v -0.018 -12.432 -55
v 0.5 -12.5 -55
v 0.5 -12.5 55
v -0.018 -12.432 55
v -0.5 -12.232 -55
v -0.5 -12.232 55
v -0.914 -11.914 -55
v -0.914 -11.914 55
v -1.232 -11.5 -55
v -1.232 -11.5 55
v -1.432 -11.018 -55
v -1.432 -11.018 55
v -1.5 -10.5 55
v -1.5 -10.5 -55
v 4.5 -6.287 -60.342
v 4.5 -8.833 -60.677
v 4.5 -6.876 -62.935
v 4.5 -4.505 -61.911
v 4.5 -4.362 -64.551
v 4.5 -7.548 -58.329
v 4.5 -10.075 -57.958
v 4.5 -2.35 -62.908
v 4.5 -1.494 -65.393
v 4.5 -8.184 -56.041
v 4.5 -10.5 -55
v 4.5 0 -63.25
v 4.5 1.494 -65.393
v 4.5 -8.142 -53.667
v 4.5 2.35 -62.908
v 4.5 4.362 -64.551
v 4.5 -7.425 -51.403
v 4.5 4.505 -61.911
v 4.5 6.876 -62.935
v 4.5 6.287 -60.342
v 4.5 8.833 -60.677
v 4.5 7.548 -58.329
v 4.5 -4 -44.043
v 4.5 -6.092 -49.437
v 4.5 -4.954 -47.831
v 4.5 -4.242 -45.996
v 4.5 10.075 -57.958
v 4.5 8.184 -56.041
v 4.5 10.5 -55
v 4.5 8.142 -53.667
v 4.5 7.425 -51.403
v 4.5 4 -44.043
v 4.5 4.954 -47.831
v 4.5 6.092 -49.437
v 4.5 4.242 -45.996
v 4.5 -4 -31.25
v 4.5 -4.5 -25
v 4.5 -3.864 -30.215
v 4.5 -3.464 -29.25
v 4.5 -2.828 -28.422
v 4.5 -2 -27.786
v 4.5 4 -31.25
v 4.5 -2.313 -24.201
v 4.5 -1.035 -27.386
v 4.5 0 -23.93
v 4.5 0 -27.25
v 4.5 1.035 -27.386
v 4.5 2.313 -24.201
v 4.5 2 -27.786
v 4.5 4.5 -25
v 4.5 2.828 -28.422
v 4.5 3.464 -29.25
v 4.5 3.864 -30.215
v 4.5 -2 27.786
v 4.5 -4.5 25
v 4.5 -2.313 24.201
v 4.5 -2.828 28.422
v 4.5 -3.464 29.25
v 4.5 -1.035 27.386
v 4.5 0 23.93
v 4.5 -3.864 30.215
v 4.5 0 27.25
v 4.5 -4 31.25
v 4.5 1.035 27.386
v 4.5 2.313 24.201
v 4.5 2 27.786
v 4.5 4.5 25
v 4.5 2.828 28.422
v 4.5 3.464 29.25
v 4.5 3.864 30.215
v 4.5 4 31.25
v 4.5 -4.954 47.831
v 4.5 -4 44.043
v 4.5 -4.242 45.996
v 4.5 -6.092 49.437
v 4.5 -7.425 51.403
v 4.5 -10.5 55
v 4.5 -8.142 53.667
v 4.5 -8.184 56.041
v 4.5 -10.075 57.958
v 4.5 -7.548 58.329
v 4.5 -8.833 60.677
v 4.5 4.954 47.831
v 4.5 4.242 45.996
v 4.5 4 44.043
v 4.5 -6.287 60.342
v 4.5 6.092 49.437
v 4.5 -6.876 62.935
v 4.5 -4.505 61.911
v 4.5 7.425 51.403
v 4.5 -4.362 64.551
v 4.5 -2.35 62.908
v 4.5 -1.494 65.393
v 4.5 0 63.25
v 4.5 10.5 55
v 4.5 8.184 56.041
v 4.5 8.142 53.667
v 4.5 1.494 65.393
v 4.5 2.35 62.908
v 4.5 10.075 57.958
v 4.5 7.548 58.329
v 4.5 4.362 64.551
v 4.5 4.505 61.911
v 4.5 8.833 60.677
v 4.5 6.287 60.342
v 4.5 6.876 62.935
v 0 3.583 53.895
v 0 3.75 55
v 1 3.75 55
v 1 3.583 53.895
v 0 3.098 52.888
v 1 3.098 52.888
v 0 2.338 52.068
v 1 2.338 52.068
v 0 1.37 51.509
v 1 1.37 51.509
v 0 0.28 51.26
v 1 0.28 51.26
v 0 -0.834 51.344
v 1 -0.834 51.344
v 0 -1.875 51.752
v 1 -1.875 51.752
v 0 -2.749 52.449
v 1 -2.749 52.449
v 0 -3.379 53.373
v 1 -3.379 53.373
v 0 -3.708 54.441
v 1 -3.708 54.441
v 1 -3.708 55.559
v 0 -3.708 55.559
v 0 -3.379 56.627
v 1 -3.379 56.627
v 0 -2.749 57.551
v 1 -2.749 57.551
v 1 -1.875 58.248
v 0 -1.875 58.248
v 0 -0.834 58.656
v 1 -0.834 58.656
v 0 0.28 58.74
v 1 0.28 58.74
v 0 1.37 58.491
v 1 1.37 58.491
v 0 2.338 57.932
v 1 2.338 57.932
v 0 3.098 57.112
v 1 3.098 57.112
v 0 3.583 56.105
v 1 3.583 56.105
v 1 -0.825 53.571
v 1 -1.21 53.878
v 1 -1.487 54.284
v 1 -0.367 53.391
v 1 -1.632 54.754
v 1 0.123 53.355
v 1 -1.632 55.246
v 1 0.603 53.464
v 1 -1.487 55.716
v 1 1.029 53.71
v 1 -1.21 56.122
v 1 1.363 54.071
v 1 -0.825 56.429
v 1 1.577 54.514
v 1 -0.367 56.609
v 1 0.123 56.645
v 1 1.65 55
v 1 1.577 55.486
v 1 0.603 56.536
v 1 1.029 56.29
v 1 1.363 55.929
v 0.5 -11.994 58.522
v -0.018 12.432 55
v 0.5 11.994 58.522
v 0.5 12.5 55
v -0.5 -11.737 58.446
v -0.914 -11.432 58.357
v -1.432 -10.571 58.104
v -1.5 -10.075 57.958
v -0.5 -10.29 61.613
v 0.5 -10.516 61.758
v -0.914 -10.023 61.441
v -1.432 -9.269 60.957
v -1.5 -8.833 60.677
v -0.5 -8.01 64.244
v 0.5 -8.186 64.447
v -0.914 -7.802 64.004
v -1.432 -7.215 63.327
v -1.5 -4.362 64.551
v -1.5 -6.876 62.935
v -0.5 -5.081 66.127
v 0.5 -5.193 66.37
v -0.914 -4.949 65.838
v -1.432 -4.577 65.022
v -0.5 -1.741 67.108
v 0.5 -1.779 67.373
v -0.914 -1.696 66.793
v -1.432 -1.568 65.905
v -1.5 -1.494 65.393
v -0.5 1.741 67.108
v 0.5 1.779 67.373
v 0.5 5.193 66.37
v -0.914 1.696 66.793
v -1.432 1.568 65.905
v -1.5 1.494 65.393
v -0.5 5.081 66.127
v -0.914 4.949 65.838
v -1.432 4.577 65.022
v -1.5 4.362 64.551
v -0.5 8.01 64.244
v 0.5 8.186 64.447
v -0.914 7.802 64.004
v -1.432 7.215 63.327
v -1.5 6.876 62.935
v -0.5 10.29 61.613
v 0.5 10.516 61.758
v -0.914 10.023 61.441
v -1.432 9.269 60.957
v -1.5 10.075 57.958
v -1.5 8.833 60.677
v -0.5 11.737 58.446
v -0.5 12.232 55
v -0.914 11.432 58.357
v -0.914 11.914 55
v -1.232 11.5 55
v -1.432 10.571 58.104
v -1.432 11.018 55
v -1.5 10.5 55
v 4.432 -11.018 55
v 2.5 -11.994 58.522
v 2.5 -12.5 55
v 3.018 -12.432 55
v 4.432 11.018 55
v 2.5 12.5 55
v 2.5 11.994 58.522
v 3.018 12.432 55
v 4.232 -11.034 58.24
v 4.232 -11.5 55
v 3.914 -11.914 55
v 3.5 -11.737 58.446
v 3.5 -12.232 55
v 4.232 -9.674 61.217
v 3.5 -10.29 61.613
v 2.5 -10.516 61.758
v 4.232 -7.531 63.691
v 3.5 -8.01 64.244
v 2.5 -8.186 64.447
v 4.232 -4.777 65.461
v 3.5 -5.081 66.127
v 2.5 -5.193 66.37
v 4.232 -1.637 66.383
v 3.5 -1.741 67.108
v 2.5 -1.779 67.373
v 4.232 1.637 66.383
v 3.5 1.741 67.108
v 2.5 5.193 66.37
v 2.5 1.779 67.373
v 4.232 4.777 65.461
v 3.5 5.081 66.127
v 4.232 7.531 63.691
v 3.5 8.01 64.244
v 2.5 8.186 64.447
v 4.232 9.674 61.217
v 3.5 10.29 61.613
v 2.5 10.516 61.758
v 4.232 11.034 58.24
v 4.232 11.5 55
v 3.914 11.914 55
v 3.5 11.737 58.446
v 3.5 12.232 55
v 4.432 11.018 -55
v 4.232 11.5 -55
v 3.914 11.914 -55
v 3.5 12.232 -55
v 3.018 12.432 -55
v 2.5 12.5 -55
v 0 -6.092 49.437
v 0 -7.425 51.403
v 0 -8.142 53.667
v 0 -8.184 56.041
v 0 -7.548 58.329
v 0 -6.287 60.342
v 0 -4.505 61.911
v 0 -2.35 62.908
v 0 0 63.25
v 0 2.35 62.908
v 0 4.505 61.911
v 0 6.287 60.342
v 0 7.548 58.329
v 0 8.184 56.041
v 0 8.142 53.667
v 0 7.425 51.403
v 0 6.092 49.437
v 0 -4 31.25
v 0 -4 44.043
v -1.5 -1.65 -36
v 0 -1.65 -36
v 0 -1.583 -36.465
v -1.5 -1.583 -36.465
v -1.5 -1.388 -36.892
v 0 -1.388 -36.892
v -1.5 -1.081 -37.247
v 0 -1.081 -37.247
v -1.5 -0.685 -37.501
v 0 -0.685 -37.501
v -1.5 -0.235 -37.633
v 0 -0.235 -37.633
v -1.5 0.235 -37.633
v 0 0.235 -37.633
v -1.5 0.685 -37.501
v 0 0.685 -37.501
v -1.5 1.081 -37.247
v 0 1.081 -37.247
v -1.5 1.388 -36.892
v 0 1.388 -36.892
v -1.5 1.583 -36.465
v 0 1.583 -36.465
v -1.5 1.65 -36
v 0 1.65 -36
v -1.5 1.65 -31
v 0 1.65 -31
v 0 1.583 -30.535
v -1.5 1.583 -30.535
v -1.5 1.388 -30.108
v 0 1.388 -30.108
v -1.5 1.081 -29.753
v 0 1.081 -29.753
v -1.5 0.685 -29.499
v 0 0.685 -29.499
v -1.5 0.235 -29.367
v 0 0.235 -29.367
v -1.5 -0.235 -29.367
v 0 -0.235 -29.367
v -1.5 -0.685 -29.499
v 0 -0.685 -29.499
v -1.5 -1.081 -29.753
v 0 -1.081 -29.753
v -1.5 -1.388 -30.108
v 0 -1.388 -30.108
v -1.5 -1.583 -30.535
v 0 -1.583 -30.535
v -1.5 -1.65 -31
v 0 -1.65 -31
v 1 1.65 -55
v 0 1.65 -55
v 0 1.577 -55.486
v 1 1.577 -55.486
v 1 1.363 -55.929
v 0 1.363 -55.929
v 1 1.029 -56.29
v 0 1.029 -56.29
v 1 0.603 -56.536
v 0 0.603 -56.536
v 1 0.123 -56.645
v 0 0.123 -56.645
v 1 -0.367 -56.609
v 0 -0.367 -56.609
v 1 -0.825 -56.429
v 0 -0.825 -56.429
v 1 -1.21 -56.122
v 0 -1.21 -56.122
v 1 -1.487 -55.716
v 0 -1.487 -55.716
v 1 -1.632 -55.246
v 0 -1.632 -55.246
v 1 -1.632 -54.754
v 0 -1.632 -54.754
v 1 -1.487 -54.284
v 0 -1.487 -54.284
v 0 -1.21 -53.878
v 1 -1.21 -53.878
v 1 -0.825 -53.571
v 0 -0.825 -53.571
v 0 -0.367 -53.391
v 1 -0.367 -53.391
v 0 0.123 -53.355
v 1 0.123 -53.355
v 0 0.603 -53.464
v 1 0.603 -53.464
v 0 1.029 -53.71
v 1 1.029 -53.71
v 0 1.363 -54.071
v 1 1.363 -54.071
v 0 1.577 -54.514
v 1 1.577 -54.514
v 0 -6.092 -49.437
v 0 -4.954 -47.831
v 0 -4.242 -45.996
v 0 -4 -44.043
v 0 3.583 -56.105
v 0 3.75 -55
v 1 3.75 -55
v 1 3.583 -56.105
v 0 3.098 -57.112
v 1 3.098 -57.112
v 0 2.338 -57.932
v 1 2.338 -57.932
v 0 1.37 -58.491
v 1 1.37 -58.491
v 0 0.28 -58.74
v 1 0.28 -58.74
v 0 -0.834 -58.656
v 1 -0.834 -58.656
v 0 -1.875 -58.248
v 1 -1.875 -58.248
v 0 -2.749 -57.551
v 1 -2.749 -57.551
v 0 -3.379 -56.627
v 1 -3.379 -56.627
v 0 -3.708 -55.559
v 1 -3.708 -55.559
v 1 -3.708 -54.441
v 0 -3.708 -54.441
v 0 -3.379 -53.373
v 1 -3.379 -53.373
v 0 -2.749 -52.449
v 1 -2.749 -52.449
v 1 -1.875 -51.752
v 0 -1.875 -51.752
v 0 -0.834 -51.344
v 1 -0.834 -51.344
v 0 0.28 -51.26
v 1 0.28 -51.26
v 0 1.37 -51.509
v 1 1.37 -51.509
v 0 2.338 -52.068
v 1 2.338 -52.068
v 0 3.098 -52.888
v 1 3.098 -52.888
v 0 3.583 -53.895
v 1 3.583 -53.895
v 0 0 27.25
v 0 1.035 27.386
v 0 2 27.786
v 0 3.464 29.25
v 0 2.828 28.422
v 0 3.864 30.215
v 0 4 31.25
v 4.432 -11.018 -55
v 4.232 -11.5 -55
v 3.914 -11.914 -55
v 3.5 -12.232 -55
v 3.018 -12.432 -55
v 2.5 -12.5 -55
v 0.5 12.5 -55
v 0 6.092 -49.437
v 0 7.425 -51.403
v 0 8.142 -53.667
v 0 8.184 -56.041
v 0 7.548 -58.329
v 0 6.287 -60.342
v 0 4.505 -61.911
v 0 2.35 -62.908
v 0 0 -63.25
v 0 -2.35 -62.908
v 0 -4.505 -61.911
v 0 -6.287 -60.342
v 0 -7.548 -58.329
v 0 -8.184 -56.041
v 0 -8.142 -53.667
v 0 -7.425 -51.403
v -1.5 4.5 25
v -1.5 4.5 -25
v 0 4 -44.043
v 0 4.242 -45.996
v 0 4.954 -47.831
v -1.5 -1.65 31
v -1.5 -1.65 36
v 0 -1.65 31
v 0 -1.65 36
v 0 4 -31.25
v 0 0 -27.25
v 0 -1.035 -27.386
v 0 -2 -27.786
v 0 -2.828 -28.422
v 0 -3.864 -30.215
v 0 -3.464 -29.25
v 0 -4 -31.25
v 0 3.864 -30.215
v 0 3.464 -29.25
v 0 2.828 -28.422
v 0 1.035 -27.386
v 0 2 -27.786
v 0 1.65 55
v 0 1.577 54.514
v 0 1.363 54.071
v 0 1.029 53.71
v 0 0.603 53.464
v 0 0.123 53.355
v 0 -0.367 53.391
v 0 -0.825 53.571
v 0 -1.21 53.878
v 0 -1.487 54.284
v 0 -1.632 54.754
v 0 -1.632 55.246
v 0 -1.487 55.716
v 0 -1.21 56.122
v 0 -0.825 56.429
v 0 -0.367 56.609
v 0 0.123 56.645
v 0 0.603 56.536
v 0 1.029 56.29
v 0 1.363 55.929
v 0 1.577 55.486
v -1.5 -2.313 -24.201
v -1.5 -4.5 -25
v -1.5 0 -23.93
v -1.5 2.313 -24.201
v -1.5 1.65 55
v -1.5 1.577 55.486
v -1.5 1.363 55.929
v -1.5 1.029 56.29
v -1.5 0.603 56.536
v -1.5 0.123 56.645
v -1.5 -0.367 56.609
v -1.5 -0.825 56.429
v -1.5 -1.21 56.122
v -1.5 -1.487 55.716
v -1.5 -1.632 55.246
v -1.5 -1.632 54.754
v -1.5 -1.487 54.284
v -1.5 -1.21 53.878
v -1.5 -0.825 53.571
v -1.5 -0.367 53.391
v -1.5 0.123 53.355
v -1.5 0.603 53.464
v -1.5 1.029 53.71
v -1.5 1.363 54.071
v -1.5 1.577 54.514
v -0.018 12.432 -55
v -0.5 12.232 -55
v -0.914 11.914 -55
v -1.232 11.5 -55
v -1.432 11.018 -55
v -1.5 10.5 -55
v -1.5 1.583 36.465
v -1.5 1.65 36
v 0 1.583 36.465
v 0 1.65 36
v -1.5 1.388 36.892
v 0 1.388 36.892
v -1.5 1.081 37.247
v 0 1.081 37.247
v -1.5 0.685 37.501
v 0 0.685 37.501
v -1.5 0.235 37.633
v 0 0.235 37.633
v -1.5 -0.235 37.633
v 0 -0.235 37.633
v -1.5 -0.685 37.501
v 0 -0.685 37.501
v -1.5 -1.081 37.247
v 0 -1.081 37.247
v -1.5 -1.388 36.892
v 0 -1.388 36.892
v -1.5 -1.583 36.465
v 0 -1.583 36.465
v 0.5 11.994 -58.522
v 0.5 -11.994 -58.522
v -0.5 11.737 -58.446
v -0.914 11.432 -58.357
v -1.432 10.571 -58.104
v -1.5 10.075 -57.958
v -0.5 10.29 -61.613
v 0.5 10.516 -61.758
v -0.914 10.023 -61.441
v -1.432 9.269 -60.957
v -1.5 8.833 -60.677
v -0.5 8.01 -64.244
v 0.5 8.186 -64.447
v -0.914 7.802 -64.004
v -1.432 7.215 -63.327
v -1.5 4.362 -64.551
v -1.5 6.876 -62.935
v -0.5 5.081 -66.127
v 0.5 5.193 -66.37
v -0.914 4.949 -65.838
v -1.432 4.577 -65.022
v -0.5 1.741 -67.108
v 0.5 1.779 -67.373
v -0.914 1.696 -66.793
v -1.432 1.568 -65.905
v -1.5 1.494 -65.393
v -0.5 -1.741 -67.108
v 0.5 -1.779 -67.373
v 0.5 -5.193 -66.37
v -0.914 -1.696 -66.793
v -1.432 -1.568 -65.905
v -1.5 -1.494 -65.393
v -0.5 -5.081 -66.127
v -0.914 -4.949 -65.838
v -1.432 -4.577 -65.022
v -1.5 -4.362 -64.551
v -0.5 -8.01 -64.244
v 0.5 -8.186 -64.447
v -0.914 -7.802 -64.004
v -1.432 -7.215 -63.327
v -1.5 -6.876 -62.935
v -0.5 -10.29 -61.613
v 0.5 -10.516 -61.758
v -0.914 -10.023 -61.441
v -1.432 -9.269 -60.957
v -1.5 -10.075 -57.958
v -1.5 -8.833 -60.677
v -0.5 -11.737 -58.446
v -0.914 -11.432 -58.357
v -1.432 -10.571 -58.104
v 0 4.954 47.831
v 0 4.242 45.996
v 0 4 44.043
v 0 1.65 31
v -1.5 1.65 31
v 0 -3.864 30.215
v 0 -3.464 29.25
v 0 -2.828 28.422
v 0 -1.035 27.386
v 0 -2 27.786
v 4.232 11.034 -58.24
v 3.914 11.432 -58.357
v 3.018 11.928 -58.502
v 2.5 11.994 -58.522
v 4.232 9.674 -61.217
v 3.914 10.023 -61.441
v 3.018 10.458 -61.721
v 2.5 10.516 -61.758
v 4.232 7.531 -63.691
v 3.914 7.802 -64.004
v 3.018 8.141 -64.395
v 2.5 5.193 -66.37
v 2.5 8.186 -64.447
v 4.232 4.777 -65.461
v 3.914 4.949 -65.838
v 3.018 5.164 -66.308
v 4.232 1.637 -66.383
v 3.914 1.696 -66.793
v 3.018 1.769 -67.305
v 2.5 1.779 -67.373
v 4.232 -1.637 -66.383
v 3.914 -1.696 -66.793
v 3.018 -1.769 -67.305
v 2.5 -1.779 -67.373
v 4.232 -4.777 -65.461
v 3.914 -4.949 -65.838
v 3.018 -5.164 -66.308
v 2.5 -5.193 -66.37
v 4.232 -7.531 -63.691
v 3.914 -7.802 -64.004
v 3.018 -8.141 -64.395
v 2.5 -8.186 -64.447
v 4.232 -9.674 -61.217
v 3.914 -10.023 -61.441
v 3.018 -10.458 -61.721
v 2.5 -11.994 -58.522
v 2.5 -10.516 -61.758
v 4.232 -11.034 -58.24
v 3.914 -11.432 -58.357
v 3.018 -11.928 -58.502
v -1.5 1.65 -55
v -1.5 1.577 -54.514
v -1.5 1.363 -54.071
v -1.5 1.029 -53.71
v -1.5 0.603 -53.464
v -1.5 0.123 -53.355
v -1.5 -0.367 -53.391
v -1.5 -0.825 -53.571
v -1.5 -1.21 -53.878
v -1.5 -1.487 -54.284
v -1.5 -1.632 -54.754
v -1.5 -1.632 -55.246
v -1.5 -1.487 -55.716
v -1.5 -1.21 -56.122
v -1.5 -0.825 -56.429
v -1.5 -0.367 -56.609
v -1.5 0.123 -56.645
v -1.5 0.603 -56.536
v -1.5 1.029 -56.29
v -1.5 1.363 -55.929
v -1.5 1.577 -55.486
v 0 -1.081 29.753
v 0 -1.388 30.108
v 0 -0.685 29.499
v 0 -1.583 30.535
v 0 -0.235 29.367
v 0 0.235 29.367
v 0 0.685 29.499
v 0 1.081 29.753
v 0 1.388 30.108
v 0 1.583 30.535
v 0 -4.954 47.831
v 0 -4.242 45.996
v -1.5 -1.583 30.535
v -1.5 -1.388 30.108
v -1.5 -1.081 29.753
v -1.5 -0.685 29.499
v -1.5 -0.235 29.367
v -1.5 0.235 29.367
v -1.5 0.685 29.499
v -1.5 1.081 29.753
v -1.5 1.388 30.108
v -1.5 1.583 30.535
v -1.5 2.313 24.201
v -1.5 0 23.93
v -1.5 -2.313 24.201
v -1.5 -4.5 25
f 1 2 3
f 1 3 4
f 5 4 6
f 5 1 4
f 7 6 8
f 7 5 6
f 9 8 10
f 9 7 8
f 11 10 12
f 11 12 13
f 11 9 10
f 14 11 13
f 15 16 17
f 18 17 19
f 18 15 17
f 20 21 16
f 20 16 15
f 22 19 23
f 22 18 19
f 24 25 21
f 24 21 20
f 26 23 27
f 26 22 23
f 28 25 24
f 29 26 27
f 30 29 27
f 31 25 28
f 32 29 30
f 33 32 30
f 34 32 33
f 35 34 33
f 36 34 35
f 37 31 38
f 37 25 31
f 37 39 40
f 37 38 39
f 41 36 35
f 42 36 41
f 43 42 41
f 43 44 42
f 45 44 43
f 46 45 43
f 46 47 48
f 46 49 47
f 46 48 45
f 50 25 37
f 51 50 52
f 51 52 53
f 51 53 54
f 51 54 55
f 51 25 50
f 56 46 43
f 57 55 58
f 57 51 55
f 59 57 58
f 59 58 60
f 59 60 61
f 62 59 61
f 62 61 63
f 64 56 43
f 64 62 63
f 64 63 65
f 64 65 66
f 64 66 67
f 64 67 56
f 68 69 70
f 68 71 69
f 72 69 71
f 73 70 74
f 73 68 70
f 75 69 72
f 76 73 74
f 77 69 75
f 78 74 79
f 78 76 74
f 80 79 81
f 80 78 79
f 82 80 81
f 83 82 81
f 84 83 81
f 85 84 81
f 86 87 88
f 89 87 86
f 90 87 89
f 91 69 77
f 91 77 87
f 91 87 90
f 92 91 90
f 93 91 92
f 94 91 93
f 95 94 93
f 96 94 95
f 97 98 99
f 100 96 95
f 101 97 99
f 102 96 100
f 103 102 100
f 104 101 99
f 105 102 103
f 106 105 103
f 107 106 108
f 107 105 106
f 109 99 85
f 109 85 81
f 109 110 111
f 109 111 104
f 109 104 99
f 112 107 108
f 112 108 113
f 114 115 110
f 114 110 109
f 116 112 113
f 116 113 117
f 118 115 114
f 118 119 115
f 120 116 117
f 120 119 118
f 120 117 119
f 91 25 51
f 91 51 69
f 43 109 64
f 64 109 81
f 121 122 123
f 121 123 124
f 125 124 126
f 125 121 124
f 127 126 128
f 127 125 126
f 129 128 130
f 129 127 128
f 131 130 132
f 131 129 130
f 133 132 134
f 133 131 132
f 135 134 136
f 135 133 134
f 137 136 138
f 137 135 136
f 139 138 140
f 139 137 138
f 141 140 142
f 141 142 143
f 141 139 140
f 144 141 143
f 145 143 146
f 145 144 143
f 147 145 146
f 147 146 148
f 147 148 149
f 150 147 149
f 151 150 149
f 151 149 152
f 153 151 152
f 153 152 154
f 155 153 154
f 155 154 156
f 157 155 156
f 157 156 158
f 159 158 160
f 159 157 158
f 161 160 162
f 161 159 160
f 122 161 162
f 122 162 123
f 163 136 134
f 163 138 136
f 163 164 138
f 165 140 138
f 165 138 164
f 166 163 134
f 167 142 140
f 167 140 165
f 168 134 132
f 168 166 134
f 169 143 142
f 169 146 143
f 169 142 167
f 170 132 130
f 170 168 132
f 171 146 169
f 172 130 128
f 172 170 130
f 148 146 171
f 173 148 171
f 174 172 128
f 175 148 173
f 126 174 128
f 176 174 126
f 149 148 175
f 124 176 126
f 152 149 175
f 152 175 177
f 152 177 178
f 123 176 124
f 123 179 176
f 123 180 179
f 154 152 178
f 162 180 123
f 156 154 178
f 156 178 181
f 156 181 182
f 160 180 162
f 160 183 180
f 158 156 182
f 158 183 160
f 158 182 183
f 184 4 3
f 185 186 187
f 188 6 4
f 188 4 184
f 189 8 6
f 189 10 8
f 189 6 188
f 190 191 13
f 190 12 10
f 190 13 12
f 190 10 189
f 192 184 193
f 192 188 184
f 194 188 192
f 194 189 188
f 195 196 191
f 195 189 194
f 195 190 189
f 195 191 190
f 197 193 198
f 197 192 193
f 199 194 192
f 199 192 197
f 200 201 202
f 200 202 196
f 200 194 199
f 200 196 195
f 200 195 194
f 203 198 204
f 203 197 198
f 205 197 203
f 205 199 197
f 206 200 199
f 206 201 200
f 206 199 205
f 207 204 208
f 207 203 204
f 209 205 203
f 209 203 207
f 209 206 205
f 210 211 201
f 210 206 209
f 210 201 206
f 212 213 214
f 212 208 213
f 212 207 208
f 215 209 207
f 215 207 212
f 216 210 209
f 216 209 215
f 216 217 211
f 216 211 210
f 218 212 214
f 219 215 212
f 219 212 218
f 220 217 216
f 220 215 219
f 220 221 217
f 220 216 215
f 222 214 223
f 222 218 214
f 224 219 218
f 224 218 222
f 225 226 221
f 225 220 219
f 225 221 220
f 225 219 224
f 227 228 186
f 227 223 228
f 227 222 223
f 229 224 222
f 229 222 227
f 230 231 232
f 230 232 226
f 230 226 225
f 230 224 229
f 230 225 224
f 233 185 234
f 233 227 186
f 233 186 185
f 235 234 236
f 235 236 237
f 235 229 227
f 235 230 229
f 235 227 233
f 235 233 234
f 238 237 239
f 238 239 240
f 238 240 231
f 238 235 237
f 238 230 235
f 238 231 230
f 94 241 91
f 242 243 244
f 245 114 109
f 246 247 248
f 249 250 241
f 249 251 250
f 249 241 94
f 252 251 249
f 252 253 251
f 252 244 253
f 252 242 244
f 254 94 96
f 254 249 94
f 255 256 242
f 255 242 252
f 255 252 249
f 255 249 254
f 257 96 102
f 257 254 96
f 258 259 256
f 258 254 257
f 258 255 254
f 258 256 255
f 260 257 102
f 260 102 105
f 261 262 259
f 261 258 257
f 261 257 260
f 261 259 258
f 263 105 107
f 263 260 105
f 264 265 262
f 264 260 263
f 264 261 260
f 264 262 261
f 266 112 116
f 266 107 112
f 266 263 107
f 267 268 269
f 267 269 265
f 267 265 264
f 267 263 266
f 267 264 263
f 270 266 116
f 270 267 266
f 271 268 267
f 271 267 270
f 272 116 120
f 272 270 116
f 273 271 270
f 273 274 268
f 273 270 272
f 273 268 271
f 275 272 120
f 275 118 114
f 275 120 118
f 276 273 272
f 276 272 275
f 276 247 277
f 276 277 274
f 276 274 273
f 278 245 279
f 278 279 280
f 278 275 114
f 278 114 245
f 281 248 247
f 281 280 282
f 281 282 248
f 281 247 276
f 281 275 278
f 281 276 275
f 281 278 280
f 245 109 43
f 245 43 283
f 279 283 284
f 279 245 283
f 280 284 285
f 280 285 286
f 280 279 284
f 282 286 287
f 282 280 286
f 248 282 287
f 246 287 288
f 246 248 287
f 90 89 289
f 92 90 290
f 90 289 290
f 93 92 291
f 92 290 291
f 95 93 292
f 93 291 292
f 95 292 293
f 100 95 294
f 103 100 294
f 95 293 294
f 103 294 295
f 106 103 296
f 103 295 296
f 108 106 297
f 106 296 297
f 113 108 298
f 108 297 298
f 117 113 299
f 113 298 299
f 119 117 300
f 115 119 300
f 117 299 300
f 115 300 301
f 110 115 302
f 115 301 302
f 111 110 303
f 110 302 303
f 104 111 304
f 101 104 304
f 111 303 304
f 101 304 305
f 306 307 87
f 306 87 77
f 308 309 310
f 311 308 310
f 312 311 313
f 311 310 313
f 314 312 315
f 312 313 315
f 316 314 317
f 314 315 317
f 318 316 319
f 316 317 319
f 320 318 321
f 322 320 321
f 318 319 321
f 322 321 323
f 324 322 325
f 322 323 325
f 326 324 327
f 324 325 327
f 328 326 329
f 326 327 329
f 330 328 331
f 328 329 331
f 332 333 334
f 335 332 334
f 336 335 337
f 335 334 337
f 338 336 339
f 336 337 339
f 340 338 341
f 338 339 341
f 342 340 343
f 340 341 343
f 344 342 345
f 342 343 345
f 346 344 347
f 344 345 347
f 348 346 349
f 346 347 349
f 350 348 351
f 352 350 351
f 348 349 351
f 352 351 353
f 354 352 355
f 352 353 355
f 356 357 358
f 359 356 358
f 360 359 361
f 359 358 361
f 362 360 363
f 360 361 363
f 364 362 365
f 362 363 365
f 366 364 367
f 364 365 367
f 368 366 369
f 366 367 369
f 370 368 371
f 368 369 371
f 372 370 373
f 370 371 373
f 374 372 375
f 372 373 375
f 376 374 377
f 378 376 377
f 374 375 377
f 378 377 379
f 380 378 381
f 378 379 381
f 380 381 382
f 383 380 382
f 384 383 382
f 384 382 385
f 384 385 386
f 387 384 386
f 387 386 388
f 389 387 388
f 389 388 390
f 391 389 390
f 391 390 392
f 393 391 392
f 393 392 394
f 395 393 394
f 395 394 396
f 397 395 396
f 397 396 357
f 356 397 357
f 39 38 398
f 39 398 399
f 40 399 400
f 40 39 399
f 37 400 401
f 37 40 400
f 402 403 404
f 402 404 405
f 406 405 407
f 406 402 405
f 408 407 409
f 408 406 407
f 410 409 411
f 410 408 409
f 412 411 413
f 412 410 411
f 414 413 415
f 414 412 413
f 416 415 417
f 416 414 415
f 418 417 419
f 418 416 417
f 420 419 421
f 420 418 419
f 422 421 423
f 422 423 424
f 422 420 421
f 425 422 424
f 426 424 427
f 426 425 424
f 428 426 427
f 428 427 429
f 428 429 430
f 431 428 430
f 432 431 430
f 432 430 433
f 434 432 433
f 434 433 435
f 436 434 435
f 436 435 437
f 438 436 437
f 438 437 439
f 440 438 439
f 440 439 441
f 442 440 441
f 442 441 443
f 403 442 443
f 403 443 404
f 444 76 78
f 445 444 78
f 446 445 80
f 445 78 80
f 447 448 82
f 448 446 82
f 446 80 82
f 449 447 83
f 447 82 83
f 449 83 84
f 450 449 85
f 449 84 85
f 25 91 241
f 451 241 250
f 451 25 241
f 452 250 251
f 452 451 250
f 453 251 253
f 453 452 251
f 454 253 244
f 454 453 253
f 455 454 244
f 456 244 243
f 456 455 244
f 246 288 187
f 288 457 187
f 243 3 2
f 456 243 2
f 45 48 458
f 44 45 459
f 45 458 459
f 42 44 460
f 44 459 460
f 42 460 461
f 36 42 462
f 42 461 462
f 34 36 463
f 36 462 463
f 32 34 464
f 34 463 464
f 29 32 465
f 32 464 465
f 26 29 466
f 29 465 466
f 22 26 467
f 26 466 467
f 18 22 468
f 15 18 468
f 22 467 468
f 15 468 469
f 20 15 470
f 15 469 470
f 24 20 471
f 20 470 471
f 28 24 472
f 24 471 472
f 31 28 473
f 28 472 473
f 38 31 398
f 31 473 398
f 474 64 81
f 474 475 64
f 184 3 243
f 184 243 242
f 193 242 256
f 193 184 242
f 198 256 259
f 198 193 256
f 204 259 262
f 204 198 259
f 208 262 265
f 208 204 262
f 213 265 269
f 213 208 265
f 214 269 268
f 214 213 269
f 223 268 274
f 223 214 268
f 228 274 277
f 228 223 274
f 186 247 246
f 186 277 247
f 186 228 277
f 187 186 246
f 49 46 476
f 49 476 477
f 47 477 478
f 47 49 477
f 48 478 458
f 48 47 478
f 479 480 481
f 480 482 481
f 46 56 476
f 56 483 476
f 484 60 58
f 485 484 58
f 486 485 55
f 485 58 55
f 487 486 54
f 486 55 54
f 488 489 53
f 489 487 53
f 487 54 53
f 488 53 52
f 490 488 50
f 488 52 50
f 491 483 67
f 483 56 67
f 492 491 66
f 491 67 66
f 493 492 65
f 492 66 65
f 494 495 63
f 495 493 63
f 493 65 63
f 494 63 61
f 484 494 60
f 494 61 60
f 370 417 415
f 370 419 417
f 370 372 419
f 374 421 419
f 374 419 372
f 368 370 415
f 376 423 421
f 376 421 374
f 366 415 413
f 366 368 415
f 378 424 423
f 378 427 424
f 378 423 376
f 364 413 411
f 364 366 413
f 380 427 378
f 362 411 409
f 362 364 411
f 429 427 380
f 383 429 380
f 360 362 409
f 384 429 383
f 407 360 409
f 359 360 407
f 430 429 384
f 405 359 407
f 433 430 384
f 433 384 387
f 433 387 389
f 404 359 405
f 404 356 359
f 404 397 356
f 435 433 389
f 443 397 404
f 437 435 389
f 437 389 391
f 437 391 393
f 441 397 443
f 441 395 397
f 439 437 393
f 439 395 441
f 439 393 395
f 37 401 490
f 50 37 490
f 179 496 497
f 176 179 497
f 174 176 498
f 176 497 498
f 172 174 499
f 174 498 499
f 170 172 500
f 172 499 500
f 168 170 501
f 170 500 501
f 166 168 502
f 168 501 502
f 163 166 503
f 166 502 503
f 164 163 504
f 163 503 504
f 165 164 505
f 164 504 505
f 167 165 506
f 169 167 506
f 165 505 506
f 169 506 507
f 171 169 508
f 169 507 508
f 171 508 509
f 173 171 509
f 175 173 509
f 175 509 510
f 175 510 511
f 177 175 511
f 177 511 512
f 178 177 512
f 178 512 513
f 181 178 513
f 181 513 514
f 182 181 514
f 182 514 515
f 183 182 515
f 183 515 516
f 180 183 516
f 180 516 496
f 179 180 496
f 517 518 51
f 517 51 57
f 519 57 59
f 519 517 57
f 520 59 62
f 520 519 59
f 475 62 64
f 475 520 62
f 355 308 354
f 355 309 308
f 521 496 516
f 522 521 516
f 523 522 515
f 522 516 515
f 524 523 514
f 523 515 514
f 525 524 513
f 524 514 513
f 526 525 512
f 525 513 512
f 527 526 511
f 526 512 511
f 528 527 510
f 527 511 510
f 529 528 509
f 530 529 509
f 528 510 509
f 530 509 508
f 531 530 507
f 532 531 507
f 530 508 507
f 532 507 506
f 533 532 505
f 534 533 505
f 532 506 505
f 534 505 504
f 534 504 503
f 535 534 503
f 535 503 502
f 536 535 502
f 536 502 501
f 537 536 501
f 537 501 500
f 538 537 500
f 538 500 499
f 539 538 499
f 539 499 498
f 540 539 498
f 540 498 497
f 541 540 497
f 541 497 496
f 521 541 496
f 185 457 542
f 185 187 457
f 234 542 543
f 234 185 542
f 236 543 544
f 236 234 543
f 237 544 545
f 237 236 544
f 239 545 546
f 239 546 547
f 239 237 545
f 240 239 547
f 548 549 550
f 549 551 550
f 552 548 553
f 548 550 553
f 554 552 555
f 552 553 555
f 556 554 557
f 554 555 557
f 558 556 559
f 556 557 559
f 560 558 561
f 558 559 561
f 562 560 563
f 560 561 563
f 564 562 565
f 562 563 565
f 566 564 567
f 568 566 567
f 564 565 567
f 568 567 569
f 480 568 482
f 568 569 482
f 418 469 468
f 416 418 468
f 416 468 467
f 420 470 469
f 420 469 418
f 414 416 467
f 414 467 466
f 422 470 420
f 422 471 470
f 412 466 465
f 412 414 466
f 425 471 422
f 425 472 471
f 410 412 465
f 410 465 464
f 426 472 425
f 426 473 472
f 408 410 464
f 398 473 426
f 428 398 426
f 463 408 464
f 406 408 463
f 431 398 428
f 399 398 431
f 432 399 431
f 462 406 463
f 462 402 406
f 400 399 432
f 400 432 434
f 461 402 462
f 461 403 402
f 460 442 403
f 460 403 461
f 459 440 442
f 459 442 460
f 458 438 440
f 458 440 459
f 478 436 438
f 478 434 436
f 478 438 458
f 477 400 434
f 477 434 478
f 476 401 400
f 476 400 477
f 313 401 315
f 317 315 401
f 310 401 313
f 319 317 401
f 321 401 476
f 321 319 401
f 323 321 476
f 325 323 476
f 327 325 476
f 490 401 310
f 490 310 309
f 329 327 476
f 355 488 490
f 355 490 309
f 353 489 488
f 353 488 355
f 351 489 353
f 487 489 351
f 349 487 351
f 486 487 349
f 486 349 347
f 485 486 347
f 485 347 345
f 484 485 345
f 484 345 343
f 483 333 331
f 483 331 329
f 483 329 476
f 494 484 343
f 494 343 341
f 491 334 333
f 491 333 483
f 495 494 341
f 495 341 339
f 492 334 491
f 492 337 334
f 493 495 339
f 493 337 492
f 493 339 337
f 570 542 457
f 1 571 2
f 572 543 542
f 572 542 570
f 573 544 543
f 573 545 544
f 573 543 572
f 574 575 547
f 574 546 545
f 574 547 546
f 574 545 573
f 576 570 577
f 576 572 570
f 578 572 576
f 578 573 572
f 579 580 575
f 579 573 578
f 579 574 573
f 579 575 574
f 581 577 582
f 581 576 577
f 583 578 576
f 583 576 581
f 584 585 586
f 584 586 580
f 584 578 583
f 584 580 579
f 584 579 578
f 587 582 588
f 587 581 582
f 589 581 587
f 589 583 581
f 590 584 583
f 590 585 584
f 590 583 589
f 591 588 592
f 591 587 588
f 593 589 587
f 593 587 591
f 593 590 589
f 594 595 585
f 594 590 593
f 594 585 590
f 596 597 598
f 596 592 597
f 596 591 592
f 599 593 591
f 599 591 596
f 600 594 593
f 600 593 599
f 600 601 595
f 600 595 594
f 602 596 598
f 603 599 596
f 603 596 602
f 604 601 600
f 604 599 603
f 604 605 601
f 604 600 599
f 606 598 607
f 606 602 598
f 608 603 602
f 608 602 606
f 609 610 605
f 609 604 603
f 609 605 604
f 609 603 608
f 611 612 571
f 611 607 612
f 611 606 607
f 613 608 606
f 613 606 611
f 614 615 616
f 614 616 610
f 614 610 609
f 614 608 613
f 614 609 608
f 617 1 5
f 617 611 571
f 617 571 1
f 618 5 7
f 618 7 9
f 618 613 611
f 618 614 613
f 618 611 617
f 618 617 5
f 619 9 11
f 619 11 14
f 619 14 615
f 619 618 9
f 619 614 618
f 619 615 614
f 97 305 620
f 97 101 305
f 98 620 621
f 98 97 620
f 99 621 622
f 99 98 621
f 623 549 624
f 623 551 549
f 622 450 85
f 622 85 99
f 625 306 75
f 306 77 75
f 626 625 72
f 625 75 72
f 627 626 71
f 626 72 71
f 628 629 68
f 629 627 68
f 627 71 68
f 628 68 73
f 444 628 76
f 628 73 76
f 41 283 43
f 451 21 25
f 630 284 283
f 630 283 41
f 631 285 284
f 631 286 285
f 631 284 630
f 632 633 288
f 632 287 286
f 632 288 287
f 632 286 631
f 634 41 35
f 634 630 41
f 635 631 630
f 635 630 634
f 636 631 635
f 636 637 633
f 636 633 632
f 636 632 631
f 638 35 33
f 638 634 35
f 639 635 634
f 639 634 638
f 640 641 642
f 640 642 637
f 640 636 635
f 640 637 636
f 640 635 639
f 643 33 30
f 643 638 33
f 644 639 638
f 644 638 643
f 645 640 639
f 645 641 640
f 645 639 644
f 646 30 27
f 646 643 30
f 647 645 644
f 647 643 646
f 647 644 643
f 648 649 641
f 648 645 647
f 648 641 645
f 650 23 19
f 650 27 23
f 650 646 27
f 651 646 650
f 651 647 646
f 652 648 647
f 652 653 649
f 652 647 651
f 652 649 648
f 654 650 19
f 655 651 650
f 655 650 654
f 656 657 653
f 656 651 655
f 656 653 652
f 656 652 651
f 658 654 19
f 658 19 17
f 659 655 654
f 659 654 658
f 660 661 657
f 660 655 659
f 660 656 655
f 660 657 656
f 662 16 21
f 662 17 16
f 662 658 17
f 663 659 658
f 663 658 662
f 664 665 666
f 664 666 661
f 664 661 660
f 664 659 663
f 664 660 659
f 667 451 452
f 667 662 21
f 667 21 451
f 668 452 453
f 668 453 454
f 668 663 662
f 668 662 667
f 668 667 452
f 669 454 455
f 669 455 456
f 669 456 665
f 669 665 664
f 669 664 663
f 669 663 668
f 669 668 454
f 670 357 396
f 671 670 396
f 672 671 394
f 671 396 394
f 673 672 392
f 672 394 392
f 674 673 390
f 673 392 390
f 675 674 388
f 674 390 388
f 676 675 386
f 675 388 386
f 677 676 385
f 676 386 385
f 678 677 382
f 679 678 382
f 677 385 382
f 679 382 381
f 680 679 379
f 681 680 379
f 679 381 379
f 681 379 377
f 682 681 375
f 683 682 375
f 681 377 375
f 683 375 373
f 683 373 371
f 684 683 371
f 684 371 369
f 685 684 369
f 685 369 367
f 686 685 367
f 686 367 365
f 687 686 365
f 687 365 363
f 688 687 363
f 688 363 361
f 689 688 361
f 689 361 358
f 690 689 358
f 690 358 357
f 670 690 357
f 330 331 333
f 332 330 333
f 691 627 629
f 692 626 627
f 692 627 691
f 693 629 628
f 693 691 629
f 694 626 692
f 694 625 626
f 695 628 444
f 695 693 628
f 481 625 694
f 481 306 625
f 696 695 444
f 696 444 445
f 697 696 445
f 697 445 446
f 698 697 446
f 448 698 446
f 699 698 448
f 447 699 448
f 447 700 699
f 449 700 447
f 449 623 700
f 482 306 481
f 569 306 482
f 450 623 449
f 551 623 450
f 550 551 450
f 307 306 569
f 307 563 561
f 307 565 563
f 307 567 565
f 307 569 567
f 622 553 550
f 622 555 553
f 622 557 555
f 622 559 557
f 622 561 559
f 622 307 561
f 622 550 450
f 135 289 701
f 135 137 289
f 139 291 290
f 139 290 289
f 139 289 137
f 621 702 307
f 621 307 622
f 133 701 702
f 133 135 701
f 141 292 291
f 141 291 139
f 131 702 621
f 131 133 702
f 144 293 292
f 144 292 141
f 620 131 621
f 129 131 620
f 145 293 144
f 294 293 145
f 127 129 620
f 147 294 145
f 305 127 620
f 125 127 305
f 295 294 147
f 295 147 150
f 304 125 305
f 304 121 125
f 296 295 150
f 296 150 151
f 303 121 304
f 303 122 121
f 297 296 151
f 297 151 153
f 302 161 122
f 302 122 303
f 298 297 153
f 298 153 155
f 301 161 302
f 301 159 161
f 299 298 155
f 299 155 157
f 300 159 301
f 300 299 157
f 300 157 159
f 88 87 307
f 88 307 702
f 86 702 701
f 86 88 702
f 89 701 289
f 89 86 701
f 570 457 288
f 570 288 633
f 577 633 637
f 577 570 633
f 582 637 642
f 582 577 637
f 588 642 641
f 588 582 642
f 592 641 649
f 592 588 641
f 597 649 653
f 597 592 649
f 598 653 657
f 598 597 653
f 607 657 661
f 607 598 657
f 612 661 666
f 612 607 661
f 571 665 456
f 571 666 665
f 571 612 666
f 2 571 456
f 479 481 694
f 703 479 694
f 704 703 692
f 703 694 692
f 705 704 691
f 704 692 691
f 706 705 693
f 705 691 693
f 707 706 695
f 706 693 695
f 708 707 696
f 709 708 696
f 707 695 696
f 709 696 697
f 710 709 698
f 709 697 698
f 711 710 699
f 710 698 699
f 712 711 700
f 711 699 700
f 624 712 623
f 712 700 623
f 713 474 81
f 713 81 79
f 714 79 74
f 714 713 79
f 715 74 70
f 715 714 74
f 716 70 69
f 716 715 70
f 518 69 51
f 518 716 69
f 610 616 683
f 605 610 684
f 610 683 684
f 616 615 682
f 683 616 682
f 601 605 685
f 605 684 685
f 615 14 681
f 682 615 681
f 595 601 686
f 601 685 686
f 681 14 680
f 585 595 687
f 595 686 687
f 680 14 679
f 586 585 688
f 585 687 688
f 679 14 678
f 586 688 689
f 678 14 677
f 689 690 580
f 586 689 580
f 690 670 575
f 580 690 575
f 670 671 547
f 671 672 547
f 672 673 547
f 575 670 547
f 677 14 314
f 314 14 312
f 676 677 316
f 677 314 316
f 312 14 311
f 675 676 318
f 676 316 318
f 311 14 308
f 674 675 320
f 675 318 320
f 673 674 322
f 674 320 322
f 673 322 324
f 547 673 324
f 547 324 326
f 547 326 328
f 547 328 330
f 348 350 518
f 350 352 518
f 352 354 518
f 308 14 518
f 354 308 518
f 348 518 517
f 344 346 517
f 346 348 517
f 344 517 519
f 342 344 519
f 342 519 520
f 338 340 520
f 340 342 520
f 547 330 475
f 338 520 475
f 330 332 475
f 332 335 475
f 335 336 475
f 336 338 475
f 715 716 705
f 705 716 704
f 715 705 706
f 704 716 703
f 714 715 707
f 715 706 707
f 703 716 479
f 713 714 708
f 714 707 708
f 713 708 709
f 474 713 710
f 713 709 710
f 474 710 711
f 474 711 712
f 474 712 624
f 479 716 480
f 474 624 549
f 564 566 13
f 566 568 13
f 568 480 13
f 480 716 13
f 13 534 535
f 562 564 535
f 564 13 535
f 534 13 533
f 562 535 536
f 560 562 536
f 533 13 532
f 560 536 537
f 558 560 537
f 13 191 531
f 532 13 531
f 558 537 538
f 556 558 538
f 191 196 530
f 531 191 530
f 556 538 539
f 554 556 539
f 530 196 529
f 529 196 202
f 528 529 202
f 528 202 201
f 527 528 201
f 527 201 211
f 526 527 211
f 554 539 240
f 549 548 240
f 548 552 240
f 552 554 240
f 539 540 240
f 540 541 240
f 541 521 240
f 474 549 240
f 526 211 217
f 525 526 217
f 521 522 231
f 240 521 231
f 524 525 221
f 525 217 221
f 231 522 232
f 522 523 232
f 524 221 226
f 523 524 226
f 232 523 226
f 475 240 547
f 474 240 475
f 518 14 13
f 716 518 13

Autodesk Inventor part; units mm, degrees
ref_plane "YZ Plane" through (0, 0, 0) normal (1, 0, 0) x (0, 1, 0)
ref_plane "XZ Plane" through (0, 0, 0) normal (0, 1, 0) x (-1, 0, 0)
ref_plane "XY Plane" through (0, 0, 0) normal (0, 0, 1) x (1, 0, 0)
sketch "Sketch1" plane through (0, 0, 0) normal (1, 0, 0) x (0, 1, 0)
  line L0 (12.5, 55) -> (-12.5, 55)
  line L1 (-12.5, 55) -> (-12.5, -55)
  line L2 (-12.5, -55) -> (12.5, -55)
  line L3 (12.5, -55) -> (12.5, 55)
  arc A0 (12.5, 55) -> (-12.5, 55) centre (0, 55) ccw
  arc A1 (-12.5, -55) -> (12.5, -55) centre (0, -55) ccw
  circle A2 centre (0, 55) radius 1.65
  circle A3 centre (0, 55) radius 3.75
  circle A4 centre (0, 55) radius 8.25
  line L4 (4, 55) -> (-4, 55)
  line L5 (-4, 55) -> (-4, 27.25)
  line L6 (-4, 27.25) -> (4, 27.25)
  line L7 (4, 27.25) -> (4, 55)
  circle A5 centre (0, 31) radius 1.65
  circle A6 centre (0, 36) radius 1.65
  line L8 (1.65, 36) -> (1.65, 31)
  line L9 (-1.65, 36) -> (-1.65, 31)
  line L10 (12.5, 0) -> (-12.5, 0) construction
  circle A7 centre (0, -55) radius 1.65
  circle A8 centre (0, -55) radius 3.75
  circle A9 centre (0, -55) radius 8.25
  line L11 (-4, -55) -> (-4, -27.25)
  line L12 (-4, -27.25) -> (4, -27.25)
  line L13 (4, -27.25) -> (4, -55)
  circle A10 centre (0, -31) radius 1.65
  circle A11 centre (0, -36) radius 1.65
  line L14 (1.65, -36) -> (1.65, -31)
  line L15 (-1.65, -36) -> (-1.65, -31)
  line L16 (4.5, 25) -> (-4.5, 25)
  line L17 (-4.5, 25) -> (-4.5, -25)
  line L18 (-4.5, -25) -> (4.5, -25)
  line L19 (4.5, -25) -> (4.5, 25)
  line L20 (4.5, 25) -> (-4.5, -25) construction
  line L21 (-4.5, 25) -> (4.5, -25) construction
  arc A12 (-4.5, 25) -> (4.5, 25) centre (0, 33.9303) ccw
  arc A13 (4.5, -25) -> (-4.5, -25) centre (0, -33.9303) ccw
  point P0 (0, 0)
  point P1 (0, 55)
  point P2 (-4, -47.7846)
  point P3 (4, -47.7846)
  point P4 (4, 47.7846)
  point P5 (-4, 47.7846)
  point P6 (0, 0)
  point P7 (3.75, 55)
  point P8 (-3.75, 55)
  dimension "d0" = 110
  dimension "d1" = 55
  dimension "d2" = 12.5
  dimension "d3" = 25
  dimension "d4" = 3.3
  dimension "d5" = 7.5
  dimension "d6" = 16.5
  dimension "d7" = 8
  dimension "d8" = 4
  dimension "d10" = 36
  dimension "d11" = 3.3
  dimension "d12" = 24
  dimension "d13" = 4
  dimension "d14" = 3.3
  dimension "d15" = 5
  dimension "d16" = 4
  dimension "d34" = 50
  dimension "d35" = 8
  dimension "d36" = 8
  dimension "d37" = 10
  dimension "d38" = 10
extrude "Extrusion1" add sketch "Sketch1" along normal blind 4.5 contours L3 L2 A9 L13 L12 L11 L1 L0 A4 L5 L6 L7 | L0 A4 A0 | A1 L2 A9 | A12 L16 | L18 A13
extrude "Extrusion2" add sketch "Sketch1" against normal blind 1.5 contours L3 L2 A9 L13 L12 L11 L1 L0 A4 L5 L6 L7 | L0 A4 A0 | A4 L7 L0 | L0 A3 A4 | A1 L2 A9 | L7 A4 L5 L0 A3 | L0 L5 A4 | L7 L6 L5 A4 | A9 L2 A8 | L2 L13 A9 | A3 L0 A2 | L0 A2 A3 | L2 A8 L11 A9 L13 | A9 L11 L12 L13 | A9 L11 L2 | A8 L2 A7 | L2 A7 A8 | A12 L16 | L18 A13
extrude "Extrusion3" add sketch "Sketch1" along normal blind 1 contours A3 L0 A2 | L0 A2 A3 | A8 L2 A7 | L2 A7 A8
fillet "Fillet1" radius 4 4 edges at (2.25, -4, 27.25) (2.25, 4, 27.25) (2.25, -4, -27.25) (2.25, 4, -27.25)
fillet "Fillet2" radius 8 4 edges at (2.25, -4, -47.7846) (2.25, 4, -47.7846) (2.25, -4, 47.7846) (2.25, 4, 47.7846)
fillet "Fillet3" radius 2 8 edges at (4.5, 0, 67.5) (4.5, -12.5, 0) (4.5, 0, -67.5) (4.5, 12.5, 0) (-1.5, 0, -67.5) (-1.5, -12.5, 0) (-1.5, 0, 67.5) (-1.5, 12.5, 0)
equation "\"d0\" = FEMUR_X"
equation "\"d1\" = 0.5 * FEMUR_X"
equation "\"d2\" = 0.5 * FEMUR_WIDTH"
equation "\"d3\" = FEMUR_WIDTH"
equation "\"d4\" = HornScrewDiameter"
equation "\"d5\" = HornCentreDiameter"
equation "\"d6\" = HornDiameter"
equation "\"d7\" = HornWidth"
equation "\"d8\" = 0.5 * HornWidth"
equation "\"d10\" = HornLength"
equation "\"d11\" = HornScrewDiameter"
equation "\"d12\" = HornScrewX"
equation "\"d13\" = 0.5 * HornWidth"
equation "\"d14\" = HornScrewDiameter"
equation "\"d15\" = HornScrewLen"
equation "\"d16\" = 0.5 * HornWidth"
equation "\"d17\" = FEMUR_HEIGHT - HORN_HEIGHT"
equation "\"d19\" = HORN_HEIGHT"
equation "\"d21\" = HornCentreHeight"
equation "\"d23\" = 0.5 * HornWidth"
equation "\"d24\" = HornFillet"
equation "\"d25\" = PART_FILLET"
equation "\"FEMUR_X\" = 110"
equation "\"FEMUR_WIDTH\" = 25"
equation "\"HornScrewDiameter\" = 3.3"
equation "\"HornCentreDiameter\" = 7.5"
equation "\"HornDiameter\" = 16.5"
equation "\"HornWidth\" = 8"
equation "\"HornLength\" = 36"
equation "\"HornScrewLen\" = 5"
equation "\"FEMUR_HEIGHT\" = 6"
equation "\"HORN_HEIGHT\" = 1.5"
equation "\"HornCentreHeight\" = 1"
equation "\"HornFillet\" = 8"
equation "\"PART_FILLET\" = 2"
equation "\"HornScrewX\" = 24"
properties part number "FemurHornSide"
